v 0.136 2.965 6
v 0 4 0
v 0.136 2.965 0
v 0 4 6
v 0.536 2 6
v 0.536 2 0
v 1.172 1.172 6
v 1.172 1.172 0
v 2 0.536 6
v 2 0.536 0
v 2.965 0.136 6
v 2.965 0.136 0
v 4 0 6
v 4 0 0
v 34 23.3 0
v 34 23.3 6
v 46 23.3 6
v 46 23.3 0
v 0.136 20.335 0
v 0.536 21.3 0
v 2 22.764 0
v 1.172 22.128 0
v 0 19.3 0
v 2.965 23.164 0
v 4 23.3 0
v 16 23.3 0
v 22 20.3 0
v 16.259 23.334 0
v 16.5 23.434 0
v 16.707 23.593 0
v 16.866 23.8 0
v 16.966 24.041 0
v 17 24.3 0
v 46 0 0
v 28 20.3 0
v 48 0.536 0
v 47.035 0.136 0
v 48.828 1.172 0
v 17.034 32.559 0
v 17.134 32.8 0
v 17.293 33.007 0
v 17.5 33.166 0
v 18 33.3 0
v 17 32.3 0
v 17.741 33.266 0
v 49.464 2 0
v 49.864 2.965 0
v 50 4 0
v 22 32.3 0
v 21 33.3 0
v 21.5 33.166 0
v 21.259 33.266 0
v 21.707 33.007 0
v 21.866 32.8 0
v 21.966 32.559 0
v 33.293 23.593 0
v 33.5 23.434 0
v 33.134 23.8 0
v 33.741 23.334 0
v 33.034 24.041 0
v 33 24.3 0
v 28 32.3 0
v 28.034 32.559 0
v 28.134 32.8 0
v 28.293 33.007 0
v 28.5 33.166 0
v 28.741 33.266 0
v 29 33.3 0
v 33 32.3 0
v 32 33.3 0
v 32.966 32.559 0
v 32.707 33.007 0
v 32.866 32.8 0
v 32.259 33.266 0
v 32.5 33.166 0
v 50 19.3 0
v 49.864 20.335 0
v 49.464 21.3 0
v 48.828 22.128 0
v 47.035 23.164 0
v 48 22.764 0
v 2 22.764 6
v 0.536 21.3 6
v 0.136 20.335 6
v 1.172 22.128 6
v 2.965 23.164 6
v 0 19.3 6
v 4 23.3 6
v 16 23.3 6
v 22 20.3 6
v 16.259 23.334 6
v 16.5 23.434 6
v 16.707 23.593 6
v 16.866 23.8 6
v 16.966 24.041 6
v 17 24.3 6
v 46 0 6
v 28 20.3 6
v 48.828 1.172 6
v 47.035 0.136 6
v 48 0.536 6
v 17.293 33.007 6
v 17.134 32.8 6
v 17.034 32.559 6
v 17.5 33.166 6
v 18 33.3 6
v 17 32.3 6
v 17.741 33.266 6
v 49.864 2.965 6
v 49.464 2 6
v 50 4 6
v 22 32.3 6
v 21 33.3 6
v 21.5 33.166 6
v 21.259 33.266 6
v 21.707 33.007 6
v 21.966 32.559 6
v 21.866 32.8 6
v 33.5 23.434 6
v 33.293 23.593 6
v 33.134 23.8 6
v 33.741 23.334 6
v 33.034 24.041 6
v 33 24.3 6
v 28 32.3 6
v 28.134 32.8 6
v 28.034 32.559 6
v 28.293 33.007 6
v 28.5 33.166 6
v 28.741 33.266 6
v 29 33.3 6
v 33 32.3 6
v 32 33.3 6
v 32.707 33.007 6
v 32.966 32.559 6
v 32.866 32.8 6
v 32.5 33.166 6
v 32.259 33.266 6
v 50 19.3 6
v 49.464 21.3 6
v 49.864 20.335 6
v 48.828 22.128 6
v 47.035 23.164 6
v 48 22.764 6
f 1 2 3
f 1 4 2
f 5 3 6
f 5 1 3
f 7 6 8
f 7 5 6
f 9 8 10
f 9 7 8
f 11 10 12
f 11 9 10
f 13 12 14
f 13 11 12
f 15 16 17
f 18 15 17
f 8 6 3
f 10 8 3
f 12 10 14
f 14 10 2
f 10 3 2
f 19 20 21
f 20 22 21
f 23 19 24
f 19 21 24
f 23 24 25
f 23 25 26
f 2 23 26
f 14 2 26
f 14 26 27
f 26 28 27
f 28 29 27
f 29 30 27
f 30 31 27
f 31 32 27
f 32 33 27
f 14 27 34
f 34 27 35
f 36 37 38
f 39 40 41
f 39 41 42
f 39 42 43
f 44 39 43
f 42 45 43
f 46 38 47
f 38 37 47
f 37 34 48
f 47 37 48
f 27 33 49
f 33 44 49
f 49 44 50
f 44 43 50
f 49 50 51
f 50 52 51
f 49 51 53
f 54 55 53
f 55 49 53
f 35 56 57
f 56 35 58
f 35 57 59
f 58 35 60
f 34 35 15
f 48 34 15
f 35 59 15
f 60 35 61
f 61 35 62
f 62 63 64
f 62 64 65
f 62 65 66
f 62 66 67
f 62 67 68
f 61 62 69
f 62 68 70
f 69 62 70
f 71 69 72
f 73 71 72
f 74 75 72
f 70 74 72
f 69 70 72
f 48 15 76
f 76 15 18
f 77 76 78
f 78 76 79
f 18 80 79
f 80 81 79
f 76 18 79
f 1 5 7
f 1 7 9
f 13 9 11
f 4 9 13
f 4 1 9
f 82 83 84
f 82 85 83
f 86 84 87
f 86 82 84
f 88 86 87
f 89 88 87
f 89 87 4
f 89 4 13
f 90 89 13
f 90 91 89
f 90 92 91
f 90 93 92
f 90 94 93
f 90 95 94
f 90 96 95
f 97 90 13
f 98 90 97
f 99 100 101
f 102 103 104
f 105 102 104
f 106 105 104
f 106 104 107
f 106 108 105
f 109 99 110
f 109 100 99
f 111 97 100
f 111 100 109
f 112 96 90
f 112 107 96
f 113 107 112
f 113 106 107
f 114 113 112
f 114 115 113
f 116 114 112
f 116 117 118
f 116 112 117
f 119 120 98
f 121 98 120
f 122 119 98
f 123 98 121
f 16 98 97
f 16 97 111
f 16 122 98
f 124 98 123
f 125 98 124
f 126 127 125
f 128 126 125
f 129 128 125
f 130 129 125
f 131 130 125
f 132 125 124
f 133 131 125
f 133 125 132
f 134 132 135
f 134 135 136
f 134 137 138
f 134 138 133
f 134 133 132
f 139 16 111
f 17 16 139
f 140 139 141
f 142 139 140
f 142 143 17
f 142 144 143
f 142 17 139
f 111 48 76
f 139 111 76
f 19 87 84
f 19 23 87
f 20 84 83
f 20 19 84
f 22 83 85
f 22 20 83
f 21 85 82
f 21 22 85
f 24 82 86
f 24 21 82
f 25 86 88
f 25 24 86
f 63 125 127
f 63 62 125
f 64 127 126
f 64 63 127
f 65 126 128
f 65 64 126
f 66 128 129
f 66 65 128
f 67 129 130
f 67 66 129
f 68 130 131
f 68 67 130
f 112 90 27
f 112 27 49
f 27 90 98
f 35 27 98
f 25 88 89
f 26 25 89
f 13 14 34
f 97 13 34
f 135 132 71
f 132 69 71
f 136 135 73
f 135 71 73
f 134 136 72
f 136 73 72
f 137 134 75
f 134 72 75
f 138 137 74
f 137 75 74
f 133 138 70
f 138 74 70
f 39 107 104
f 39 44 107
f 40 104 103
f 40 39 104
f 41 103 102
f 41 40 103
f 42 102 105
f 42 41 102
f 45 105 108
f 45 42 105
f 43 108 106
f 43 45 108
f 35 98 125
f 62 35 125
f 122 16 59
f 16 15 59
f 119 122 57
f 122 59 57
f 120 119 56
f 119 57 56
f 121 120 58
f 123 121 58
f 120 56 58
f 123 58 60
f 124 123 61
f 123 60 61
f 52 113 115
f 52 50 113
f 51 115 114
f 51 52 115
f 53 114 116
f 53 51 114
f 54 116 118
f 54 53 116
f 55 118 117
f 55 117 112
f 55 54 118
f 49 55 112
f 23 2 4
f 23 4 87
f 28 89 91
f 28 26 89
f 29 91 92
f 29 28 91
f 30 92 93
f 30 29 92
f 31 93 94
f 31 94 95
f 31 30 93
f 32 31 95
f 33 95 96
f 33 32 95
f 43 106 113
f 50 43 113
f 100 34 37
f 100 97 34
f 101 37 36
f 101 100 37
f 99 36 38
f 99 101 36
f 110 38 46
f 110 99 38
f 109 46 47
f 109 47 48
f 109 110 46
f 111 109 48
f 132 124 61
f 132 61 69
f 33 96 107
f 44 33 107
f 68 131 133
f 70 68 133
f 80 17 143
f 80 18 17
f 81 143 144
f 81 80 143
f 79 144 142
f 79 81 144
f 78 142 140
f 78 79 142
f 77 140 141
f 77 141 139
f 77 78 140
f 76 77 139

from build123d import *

# Parameters (mm, degrees)
ESQUISSE1_W             = 50
ESQUISSE1_H             = 44
BOSS_EXTRU_1_DEPTH      = 6
ESQUISSE2_W             = 6
ESQUISSE2_H             = 23.7
ESQUISSE2_W_2           = 17
ESQUISSE2_H_2           = 20.7
ENL_V_MAT_EXTRU_1_DEPTH = 6
ESQUISSE3_W             = 5
ESQUISSE3_H             = 10.7
ENL_V_MAT_EXTRU_2_DEPTH = 6
CONG_1_R                = 4
CONG_2_R                = 1


with BuildPart() as part:
    # Esquisse1 → Boss.-Extru.1 (new body)
    with BuildSketch(Plane.XY):
        with Locations((25, 22)):
            Rectangle(ESQUISSE1_W, ESQUISSE1_H)
    extrude(amount=BOSS_EXTRU_1_DEPTH)

    # Esquisse2 → Enlèv. mat.-Extru.1 (cut)
    with BuildSketch(Plane.XY.offset(6)):
        with Locations((25, 32.15)):
            Rectangle(ESQUISSE2_W, ESQUISSE2_H)
        with Locations((41.5, 33.65)):
            Rectangle(ESQUISSE2_W_2, ESQUISSE2_H_2)
        with Locations((8.5, 33.65)):
            Rectangle(ESQUISSE2_W_2, ESQUISSE2_H_2)
    extrude(amount=-ENL_V_MAT_EXTRU_1_DEPTH, mode=Mode.SUBTRACT)

    # Esquisse3 → Enlèv. mat.-Extru.2 (cut)
    with BuildSketch(Plane.XY.offset(6)):
        with Locations((19.5, 38.65)):
            Rectangle(ESQUISSE3_W, ESQUISSE3_H)
        with Locations((30.5, 38.65)):
            Rectangle(ESQUISSE3_W, ESQUISSE3_H)
    extrude(amount=-ENL_V_MAT_EXTRU_2_DEPTH, mode=Mode.SUBTRACT)

    # Congé1
    cong_1_edges = [part.edges().sort_by_distance(p)[0] for p in [
        (50, 23.3, 3),
        (0, 23.3, 3),
        (50, 0, 3),
        (0, 0, 3),
    ]]
    fillet(cong_1_edges, radius=CONG_1_R)

    # Congé2
    cong_2_edges = [part.edges().sort_by_distance(p)[0] for p in [
        (33, 23.3, 3),
        (17, 23.3, 3),
        (17, 33.3, 3),
        (22, 33.3, 3),
        (28, 33.3, 3),
        (33, 33.3, 3),
    ]]
    fillet(cong_2_edges, radius=CONG_2_R)


solid = part.part
